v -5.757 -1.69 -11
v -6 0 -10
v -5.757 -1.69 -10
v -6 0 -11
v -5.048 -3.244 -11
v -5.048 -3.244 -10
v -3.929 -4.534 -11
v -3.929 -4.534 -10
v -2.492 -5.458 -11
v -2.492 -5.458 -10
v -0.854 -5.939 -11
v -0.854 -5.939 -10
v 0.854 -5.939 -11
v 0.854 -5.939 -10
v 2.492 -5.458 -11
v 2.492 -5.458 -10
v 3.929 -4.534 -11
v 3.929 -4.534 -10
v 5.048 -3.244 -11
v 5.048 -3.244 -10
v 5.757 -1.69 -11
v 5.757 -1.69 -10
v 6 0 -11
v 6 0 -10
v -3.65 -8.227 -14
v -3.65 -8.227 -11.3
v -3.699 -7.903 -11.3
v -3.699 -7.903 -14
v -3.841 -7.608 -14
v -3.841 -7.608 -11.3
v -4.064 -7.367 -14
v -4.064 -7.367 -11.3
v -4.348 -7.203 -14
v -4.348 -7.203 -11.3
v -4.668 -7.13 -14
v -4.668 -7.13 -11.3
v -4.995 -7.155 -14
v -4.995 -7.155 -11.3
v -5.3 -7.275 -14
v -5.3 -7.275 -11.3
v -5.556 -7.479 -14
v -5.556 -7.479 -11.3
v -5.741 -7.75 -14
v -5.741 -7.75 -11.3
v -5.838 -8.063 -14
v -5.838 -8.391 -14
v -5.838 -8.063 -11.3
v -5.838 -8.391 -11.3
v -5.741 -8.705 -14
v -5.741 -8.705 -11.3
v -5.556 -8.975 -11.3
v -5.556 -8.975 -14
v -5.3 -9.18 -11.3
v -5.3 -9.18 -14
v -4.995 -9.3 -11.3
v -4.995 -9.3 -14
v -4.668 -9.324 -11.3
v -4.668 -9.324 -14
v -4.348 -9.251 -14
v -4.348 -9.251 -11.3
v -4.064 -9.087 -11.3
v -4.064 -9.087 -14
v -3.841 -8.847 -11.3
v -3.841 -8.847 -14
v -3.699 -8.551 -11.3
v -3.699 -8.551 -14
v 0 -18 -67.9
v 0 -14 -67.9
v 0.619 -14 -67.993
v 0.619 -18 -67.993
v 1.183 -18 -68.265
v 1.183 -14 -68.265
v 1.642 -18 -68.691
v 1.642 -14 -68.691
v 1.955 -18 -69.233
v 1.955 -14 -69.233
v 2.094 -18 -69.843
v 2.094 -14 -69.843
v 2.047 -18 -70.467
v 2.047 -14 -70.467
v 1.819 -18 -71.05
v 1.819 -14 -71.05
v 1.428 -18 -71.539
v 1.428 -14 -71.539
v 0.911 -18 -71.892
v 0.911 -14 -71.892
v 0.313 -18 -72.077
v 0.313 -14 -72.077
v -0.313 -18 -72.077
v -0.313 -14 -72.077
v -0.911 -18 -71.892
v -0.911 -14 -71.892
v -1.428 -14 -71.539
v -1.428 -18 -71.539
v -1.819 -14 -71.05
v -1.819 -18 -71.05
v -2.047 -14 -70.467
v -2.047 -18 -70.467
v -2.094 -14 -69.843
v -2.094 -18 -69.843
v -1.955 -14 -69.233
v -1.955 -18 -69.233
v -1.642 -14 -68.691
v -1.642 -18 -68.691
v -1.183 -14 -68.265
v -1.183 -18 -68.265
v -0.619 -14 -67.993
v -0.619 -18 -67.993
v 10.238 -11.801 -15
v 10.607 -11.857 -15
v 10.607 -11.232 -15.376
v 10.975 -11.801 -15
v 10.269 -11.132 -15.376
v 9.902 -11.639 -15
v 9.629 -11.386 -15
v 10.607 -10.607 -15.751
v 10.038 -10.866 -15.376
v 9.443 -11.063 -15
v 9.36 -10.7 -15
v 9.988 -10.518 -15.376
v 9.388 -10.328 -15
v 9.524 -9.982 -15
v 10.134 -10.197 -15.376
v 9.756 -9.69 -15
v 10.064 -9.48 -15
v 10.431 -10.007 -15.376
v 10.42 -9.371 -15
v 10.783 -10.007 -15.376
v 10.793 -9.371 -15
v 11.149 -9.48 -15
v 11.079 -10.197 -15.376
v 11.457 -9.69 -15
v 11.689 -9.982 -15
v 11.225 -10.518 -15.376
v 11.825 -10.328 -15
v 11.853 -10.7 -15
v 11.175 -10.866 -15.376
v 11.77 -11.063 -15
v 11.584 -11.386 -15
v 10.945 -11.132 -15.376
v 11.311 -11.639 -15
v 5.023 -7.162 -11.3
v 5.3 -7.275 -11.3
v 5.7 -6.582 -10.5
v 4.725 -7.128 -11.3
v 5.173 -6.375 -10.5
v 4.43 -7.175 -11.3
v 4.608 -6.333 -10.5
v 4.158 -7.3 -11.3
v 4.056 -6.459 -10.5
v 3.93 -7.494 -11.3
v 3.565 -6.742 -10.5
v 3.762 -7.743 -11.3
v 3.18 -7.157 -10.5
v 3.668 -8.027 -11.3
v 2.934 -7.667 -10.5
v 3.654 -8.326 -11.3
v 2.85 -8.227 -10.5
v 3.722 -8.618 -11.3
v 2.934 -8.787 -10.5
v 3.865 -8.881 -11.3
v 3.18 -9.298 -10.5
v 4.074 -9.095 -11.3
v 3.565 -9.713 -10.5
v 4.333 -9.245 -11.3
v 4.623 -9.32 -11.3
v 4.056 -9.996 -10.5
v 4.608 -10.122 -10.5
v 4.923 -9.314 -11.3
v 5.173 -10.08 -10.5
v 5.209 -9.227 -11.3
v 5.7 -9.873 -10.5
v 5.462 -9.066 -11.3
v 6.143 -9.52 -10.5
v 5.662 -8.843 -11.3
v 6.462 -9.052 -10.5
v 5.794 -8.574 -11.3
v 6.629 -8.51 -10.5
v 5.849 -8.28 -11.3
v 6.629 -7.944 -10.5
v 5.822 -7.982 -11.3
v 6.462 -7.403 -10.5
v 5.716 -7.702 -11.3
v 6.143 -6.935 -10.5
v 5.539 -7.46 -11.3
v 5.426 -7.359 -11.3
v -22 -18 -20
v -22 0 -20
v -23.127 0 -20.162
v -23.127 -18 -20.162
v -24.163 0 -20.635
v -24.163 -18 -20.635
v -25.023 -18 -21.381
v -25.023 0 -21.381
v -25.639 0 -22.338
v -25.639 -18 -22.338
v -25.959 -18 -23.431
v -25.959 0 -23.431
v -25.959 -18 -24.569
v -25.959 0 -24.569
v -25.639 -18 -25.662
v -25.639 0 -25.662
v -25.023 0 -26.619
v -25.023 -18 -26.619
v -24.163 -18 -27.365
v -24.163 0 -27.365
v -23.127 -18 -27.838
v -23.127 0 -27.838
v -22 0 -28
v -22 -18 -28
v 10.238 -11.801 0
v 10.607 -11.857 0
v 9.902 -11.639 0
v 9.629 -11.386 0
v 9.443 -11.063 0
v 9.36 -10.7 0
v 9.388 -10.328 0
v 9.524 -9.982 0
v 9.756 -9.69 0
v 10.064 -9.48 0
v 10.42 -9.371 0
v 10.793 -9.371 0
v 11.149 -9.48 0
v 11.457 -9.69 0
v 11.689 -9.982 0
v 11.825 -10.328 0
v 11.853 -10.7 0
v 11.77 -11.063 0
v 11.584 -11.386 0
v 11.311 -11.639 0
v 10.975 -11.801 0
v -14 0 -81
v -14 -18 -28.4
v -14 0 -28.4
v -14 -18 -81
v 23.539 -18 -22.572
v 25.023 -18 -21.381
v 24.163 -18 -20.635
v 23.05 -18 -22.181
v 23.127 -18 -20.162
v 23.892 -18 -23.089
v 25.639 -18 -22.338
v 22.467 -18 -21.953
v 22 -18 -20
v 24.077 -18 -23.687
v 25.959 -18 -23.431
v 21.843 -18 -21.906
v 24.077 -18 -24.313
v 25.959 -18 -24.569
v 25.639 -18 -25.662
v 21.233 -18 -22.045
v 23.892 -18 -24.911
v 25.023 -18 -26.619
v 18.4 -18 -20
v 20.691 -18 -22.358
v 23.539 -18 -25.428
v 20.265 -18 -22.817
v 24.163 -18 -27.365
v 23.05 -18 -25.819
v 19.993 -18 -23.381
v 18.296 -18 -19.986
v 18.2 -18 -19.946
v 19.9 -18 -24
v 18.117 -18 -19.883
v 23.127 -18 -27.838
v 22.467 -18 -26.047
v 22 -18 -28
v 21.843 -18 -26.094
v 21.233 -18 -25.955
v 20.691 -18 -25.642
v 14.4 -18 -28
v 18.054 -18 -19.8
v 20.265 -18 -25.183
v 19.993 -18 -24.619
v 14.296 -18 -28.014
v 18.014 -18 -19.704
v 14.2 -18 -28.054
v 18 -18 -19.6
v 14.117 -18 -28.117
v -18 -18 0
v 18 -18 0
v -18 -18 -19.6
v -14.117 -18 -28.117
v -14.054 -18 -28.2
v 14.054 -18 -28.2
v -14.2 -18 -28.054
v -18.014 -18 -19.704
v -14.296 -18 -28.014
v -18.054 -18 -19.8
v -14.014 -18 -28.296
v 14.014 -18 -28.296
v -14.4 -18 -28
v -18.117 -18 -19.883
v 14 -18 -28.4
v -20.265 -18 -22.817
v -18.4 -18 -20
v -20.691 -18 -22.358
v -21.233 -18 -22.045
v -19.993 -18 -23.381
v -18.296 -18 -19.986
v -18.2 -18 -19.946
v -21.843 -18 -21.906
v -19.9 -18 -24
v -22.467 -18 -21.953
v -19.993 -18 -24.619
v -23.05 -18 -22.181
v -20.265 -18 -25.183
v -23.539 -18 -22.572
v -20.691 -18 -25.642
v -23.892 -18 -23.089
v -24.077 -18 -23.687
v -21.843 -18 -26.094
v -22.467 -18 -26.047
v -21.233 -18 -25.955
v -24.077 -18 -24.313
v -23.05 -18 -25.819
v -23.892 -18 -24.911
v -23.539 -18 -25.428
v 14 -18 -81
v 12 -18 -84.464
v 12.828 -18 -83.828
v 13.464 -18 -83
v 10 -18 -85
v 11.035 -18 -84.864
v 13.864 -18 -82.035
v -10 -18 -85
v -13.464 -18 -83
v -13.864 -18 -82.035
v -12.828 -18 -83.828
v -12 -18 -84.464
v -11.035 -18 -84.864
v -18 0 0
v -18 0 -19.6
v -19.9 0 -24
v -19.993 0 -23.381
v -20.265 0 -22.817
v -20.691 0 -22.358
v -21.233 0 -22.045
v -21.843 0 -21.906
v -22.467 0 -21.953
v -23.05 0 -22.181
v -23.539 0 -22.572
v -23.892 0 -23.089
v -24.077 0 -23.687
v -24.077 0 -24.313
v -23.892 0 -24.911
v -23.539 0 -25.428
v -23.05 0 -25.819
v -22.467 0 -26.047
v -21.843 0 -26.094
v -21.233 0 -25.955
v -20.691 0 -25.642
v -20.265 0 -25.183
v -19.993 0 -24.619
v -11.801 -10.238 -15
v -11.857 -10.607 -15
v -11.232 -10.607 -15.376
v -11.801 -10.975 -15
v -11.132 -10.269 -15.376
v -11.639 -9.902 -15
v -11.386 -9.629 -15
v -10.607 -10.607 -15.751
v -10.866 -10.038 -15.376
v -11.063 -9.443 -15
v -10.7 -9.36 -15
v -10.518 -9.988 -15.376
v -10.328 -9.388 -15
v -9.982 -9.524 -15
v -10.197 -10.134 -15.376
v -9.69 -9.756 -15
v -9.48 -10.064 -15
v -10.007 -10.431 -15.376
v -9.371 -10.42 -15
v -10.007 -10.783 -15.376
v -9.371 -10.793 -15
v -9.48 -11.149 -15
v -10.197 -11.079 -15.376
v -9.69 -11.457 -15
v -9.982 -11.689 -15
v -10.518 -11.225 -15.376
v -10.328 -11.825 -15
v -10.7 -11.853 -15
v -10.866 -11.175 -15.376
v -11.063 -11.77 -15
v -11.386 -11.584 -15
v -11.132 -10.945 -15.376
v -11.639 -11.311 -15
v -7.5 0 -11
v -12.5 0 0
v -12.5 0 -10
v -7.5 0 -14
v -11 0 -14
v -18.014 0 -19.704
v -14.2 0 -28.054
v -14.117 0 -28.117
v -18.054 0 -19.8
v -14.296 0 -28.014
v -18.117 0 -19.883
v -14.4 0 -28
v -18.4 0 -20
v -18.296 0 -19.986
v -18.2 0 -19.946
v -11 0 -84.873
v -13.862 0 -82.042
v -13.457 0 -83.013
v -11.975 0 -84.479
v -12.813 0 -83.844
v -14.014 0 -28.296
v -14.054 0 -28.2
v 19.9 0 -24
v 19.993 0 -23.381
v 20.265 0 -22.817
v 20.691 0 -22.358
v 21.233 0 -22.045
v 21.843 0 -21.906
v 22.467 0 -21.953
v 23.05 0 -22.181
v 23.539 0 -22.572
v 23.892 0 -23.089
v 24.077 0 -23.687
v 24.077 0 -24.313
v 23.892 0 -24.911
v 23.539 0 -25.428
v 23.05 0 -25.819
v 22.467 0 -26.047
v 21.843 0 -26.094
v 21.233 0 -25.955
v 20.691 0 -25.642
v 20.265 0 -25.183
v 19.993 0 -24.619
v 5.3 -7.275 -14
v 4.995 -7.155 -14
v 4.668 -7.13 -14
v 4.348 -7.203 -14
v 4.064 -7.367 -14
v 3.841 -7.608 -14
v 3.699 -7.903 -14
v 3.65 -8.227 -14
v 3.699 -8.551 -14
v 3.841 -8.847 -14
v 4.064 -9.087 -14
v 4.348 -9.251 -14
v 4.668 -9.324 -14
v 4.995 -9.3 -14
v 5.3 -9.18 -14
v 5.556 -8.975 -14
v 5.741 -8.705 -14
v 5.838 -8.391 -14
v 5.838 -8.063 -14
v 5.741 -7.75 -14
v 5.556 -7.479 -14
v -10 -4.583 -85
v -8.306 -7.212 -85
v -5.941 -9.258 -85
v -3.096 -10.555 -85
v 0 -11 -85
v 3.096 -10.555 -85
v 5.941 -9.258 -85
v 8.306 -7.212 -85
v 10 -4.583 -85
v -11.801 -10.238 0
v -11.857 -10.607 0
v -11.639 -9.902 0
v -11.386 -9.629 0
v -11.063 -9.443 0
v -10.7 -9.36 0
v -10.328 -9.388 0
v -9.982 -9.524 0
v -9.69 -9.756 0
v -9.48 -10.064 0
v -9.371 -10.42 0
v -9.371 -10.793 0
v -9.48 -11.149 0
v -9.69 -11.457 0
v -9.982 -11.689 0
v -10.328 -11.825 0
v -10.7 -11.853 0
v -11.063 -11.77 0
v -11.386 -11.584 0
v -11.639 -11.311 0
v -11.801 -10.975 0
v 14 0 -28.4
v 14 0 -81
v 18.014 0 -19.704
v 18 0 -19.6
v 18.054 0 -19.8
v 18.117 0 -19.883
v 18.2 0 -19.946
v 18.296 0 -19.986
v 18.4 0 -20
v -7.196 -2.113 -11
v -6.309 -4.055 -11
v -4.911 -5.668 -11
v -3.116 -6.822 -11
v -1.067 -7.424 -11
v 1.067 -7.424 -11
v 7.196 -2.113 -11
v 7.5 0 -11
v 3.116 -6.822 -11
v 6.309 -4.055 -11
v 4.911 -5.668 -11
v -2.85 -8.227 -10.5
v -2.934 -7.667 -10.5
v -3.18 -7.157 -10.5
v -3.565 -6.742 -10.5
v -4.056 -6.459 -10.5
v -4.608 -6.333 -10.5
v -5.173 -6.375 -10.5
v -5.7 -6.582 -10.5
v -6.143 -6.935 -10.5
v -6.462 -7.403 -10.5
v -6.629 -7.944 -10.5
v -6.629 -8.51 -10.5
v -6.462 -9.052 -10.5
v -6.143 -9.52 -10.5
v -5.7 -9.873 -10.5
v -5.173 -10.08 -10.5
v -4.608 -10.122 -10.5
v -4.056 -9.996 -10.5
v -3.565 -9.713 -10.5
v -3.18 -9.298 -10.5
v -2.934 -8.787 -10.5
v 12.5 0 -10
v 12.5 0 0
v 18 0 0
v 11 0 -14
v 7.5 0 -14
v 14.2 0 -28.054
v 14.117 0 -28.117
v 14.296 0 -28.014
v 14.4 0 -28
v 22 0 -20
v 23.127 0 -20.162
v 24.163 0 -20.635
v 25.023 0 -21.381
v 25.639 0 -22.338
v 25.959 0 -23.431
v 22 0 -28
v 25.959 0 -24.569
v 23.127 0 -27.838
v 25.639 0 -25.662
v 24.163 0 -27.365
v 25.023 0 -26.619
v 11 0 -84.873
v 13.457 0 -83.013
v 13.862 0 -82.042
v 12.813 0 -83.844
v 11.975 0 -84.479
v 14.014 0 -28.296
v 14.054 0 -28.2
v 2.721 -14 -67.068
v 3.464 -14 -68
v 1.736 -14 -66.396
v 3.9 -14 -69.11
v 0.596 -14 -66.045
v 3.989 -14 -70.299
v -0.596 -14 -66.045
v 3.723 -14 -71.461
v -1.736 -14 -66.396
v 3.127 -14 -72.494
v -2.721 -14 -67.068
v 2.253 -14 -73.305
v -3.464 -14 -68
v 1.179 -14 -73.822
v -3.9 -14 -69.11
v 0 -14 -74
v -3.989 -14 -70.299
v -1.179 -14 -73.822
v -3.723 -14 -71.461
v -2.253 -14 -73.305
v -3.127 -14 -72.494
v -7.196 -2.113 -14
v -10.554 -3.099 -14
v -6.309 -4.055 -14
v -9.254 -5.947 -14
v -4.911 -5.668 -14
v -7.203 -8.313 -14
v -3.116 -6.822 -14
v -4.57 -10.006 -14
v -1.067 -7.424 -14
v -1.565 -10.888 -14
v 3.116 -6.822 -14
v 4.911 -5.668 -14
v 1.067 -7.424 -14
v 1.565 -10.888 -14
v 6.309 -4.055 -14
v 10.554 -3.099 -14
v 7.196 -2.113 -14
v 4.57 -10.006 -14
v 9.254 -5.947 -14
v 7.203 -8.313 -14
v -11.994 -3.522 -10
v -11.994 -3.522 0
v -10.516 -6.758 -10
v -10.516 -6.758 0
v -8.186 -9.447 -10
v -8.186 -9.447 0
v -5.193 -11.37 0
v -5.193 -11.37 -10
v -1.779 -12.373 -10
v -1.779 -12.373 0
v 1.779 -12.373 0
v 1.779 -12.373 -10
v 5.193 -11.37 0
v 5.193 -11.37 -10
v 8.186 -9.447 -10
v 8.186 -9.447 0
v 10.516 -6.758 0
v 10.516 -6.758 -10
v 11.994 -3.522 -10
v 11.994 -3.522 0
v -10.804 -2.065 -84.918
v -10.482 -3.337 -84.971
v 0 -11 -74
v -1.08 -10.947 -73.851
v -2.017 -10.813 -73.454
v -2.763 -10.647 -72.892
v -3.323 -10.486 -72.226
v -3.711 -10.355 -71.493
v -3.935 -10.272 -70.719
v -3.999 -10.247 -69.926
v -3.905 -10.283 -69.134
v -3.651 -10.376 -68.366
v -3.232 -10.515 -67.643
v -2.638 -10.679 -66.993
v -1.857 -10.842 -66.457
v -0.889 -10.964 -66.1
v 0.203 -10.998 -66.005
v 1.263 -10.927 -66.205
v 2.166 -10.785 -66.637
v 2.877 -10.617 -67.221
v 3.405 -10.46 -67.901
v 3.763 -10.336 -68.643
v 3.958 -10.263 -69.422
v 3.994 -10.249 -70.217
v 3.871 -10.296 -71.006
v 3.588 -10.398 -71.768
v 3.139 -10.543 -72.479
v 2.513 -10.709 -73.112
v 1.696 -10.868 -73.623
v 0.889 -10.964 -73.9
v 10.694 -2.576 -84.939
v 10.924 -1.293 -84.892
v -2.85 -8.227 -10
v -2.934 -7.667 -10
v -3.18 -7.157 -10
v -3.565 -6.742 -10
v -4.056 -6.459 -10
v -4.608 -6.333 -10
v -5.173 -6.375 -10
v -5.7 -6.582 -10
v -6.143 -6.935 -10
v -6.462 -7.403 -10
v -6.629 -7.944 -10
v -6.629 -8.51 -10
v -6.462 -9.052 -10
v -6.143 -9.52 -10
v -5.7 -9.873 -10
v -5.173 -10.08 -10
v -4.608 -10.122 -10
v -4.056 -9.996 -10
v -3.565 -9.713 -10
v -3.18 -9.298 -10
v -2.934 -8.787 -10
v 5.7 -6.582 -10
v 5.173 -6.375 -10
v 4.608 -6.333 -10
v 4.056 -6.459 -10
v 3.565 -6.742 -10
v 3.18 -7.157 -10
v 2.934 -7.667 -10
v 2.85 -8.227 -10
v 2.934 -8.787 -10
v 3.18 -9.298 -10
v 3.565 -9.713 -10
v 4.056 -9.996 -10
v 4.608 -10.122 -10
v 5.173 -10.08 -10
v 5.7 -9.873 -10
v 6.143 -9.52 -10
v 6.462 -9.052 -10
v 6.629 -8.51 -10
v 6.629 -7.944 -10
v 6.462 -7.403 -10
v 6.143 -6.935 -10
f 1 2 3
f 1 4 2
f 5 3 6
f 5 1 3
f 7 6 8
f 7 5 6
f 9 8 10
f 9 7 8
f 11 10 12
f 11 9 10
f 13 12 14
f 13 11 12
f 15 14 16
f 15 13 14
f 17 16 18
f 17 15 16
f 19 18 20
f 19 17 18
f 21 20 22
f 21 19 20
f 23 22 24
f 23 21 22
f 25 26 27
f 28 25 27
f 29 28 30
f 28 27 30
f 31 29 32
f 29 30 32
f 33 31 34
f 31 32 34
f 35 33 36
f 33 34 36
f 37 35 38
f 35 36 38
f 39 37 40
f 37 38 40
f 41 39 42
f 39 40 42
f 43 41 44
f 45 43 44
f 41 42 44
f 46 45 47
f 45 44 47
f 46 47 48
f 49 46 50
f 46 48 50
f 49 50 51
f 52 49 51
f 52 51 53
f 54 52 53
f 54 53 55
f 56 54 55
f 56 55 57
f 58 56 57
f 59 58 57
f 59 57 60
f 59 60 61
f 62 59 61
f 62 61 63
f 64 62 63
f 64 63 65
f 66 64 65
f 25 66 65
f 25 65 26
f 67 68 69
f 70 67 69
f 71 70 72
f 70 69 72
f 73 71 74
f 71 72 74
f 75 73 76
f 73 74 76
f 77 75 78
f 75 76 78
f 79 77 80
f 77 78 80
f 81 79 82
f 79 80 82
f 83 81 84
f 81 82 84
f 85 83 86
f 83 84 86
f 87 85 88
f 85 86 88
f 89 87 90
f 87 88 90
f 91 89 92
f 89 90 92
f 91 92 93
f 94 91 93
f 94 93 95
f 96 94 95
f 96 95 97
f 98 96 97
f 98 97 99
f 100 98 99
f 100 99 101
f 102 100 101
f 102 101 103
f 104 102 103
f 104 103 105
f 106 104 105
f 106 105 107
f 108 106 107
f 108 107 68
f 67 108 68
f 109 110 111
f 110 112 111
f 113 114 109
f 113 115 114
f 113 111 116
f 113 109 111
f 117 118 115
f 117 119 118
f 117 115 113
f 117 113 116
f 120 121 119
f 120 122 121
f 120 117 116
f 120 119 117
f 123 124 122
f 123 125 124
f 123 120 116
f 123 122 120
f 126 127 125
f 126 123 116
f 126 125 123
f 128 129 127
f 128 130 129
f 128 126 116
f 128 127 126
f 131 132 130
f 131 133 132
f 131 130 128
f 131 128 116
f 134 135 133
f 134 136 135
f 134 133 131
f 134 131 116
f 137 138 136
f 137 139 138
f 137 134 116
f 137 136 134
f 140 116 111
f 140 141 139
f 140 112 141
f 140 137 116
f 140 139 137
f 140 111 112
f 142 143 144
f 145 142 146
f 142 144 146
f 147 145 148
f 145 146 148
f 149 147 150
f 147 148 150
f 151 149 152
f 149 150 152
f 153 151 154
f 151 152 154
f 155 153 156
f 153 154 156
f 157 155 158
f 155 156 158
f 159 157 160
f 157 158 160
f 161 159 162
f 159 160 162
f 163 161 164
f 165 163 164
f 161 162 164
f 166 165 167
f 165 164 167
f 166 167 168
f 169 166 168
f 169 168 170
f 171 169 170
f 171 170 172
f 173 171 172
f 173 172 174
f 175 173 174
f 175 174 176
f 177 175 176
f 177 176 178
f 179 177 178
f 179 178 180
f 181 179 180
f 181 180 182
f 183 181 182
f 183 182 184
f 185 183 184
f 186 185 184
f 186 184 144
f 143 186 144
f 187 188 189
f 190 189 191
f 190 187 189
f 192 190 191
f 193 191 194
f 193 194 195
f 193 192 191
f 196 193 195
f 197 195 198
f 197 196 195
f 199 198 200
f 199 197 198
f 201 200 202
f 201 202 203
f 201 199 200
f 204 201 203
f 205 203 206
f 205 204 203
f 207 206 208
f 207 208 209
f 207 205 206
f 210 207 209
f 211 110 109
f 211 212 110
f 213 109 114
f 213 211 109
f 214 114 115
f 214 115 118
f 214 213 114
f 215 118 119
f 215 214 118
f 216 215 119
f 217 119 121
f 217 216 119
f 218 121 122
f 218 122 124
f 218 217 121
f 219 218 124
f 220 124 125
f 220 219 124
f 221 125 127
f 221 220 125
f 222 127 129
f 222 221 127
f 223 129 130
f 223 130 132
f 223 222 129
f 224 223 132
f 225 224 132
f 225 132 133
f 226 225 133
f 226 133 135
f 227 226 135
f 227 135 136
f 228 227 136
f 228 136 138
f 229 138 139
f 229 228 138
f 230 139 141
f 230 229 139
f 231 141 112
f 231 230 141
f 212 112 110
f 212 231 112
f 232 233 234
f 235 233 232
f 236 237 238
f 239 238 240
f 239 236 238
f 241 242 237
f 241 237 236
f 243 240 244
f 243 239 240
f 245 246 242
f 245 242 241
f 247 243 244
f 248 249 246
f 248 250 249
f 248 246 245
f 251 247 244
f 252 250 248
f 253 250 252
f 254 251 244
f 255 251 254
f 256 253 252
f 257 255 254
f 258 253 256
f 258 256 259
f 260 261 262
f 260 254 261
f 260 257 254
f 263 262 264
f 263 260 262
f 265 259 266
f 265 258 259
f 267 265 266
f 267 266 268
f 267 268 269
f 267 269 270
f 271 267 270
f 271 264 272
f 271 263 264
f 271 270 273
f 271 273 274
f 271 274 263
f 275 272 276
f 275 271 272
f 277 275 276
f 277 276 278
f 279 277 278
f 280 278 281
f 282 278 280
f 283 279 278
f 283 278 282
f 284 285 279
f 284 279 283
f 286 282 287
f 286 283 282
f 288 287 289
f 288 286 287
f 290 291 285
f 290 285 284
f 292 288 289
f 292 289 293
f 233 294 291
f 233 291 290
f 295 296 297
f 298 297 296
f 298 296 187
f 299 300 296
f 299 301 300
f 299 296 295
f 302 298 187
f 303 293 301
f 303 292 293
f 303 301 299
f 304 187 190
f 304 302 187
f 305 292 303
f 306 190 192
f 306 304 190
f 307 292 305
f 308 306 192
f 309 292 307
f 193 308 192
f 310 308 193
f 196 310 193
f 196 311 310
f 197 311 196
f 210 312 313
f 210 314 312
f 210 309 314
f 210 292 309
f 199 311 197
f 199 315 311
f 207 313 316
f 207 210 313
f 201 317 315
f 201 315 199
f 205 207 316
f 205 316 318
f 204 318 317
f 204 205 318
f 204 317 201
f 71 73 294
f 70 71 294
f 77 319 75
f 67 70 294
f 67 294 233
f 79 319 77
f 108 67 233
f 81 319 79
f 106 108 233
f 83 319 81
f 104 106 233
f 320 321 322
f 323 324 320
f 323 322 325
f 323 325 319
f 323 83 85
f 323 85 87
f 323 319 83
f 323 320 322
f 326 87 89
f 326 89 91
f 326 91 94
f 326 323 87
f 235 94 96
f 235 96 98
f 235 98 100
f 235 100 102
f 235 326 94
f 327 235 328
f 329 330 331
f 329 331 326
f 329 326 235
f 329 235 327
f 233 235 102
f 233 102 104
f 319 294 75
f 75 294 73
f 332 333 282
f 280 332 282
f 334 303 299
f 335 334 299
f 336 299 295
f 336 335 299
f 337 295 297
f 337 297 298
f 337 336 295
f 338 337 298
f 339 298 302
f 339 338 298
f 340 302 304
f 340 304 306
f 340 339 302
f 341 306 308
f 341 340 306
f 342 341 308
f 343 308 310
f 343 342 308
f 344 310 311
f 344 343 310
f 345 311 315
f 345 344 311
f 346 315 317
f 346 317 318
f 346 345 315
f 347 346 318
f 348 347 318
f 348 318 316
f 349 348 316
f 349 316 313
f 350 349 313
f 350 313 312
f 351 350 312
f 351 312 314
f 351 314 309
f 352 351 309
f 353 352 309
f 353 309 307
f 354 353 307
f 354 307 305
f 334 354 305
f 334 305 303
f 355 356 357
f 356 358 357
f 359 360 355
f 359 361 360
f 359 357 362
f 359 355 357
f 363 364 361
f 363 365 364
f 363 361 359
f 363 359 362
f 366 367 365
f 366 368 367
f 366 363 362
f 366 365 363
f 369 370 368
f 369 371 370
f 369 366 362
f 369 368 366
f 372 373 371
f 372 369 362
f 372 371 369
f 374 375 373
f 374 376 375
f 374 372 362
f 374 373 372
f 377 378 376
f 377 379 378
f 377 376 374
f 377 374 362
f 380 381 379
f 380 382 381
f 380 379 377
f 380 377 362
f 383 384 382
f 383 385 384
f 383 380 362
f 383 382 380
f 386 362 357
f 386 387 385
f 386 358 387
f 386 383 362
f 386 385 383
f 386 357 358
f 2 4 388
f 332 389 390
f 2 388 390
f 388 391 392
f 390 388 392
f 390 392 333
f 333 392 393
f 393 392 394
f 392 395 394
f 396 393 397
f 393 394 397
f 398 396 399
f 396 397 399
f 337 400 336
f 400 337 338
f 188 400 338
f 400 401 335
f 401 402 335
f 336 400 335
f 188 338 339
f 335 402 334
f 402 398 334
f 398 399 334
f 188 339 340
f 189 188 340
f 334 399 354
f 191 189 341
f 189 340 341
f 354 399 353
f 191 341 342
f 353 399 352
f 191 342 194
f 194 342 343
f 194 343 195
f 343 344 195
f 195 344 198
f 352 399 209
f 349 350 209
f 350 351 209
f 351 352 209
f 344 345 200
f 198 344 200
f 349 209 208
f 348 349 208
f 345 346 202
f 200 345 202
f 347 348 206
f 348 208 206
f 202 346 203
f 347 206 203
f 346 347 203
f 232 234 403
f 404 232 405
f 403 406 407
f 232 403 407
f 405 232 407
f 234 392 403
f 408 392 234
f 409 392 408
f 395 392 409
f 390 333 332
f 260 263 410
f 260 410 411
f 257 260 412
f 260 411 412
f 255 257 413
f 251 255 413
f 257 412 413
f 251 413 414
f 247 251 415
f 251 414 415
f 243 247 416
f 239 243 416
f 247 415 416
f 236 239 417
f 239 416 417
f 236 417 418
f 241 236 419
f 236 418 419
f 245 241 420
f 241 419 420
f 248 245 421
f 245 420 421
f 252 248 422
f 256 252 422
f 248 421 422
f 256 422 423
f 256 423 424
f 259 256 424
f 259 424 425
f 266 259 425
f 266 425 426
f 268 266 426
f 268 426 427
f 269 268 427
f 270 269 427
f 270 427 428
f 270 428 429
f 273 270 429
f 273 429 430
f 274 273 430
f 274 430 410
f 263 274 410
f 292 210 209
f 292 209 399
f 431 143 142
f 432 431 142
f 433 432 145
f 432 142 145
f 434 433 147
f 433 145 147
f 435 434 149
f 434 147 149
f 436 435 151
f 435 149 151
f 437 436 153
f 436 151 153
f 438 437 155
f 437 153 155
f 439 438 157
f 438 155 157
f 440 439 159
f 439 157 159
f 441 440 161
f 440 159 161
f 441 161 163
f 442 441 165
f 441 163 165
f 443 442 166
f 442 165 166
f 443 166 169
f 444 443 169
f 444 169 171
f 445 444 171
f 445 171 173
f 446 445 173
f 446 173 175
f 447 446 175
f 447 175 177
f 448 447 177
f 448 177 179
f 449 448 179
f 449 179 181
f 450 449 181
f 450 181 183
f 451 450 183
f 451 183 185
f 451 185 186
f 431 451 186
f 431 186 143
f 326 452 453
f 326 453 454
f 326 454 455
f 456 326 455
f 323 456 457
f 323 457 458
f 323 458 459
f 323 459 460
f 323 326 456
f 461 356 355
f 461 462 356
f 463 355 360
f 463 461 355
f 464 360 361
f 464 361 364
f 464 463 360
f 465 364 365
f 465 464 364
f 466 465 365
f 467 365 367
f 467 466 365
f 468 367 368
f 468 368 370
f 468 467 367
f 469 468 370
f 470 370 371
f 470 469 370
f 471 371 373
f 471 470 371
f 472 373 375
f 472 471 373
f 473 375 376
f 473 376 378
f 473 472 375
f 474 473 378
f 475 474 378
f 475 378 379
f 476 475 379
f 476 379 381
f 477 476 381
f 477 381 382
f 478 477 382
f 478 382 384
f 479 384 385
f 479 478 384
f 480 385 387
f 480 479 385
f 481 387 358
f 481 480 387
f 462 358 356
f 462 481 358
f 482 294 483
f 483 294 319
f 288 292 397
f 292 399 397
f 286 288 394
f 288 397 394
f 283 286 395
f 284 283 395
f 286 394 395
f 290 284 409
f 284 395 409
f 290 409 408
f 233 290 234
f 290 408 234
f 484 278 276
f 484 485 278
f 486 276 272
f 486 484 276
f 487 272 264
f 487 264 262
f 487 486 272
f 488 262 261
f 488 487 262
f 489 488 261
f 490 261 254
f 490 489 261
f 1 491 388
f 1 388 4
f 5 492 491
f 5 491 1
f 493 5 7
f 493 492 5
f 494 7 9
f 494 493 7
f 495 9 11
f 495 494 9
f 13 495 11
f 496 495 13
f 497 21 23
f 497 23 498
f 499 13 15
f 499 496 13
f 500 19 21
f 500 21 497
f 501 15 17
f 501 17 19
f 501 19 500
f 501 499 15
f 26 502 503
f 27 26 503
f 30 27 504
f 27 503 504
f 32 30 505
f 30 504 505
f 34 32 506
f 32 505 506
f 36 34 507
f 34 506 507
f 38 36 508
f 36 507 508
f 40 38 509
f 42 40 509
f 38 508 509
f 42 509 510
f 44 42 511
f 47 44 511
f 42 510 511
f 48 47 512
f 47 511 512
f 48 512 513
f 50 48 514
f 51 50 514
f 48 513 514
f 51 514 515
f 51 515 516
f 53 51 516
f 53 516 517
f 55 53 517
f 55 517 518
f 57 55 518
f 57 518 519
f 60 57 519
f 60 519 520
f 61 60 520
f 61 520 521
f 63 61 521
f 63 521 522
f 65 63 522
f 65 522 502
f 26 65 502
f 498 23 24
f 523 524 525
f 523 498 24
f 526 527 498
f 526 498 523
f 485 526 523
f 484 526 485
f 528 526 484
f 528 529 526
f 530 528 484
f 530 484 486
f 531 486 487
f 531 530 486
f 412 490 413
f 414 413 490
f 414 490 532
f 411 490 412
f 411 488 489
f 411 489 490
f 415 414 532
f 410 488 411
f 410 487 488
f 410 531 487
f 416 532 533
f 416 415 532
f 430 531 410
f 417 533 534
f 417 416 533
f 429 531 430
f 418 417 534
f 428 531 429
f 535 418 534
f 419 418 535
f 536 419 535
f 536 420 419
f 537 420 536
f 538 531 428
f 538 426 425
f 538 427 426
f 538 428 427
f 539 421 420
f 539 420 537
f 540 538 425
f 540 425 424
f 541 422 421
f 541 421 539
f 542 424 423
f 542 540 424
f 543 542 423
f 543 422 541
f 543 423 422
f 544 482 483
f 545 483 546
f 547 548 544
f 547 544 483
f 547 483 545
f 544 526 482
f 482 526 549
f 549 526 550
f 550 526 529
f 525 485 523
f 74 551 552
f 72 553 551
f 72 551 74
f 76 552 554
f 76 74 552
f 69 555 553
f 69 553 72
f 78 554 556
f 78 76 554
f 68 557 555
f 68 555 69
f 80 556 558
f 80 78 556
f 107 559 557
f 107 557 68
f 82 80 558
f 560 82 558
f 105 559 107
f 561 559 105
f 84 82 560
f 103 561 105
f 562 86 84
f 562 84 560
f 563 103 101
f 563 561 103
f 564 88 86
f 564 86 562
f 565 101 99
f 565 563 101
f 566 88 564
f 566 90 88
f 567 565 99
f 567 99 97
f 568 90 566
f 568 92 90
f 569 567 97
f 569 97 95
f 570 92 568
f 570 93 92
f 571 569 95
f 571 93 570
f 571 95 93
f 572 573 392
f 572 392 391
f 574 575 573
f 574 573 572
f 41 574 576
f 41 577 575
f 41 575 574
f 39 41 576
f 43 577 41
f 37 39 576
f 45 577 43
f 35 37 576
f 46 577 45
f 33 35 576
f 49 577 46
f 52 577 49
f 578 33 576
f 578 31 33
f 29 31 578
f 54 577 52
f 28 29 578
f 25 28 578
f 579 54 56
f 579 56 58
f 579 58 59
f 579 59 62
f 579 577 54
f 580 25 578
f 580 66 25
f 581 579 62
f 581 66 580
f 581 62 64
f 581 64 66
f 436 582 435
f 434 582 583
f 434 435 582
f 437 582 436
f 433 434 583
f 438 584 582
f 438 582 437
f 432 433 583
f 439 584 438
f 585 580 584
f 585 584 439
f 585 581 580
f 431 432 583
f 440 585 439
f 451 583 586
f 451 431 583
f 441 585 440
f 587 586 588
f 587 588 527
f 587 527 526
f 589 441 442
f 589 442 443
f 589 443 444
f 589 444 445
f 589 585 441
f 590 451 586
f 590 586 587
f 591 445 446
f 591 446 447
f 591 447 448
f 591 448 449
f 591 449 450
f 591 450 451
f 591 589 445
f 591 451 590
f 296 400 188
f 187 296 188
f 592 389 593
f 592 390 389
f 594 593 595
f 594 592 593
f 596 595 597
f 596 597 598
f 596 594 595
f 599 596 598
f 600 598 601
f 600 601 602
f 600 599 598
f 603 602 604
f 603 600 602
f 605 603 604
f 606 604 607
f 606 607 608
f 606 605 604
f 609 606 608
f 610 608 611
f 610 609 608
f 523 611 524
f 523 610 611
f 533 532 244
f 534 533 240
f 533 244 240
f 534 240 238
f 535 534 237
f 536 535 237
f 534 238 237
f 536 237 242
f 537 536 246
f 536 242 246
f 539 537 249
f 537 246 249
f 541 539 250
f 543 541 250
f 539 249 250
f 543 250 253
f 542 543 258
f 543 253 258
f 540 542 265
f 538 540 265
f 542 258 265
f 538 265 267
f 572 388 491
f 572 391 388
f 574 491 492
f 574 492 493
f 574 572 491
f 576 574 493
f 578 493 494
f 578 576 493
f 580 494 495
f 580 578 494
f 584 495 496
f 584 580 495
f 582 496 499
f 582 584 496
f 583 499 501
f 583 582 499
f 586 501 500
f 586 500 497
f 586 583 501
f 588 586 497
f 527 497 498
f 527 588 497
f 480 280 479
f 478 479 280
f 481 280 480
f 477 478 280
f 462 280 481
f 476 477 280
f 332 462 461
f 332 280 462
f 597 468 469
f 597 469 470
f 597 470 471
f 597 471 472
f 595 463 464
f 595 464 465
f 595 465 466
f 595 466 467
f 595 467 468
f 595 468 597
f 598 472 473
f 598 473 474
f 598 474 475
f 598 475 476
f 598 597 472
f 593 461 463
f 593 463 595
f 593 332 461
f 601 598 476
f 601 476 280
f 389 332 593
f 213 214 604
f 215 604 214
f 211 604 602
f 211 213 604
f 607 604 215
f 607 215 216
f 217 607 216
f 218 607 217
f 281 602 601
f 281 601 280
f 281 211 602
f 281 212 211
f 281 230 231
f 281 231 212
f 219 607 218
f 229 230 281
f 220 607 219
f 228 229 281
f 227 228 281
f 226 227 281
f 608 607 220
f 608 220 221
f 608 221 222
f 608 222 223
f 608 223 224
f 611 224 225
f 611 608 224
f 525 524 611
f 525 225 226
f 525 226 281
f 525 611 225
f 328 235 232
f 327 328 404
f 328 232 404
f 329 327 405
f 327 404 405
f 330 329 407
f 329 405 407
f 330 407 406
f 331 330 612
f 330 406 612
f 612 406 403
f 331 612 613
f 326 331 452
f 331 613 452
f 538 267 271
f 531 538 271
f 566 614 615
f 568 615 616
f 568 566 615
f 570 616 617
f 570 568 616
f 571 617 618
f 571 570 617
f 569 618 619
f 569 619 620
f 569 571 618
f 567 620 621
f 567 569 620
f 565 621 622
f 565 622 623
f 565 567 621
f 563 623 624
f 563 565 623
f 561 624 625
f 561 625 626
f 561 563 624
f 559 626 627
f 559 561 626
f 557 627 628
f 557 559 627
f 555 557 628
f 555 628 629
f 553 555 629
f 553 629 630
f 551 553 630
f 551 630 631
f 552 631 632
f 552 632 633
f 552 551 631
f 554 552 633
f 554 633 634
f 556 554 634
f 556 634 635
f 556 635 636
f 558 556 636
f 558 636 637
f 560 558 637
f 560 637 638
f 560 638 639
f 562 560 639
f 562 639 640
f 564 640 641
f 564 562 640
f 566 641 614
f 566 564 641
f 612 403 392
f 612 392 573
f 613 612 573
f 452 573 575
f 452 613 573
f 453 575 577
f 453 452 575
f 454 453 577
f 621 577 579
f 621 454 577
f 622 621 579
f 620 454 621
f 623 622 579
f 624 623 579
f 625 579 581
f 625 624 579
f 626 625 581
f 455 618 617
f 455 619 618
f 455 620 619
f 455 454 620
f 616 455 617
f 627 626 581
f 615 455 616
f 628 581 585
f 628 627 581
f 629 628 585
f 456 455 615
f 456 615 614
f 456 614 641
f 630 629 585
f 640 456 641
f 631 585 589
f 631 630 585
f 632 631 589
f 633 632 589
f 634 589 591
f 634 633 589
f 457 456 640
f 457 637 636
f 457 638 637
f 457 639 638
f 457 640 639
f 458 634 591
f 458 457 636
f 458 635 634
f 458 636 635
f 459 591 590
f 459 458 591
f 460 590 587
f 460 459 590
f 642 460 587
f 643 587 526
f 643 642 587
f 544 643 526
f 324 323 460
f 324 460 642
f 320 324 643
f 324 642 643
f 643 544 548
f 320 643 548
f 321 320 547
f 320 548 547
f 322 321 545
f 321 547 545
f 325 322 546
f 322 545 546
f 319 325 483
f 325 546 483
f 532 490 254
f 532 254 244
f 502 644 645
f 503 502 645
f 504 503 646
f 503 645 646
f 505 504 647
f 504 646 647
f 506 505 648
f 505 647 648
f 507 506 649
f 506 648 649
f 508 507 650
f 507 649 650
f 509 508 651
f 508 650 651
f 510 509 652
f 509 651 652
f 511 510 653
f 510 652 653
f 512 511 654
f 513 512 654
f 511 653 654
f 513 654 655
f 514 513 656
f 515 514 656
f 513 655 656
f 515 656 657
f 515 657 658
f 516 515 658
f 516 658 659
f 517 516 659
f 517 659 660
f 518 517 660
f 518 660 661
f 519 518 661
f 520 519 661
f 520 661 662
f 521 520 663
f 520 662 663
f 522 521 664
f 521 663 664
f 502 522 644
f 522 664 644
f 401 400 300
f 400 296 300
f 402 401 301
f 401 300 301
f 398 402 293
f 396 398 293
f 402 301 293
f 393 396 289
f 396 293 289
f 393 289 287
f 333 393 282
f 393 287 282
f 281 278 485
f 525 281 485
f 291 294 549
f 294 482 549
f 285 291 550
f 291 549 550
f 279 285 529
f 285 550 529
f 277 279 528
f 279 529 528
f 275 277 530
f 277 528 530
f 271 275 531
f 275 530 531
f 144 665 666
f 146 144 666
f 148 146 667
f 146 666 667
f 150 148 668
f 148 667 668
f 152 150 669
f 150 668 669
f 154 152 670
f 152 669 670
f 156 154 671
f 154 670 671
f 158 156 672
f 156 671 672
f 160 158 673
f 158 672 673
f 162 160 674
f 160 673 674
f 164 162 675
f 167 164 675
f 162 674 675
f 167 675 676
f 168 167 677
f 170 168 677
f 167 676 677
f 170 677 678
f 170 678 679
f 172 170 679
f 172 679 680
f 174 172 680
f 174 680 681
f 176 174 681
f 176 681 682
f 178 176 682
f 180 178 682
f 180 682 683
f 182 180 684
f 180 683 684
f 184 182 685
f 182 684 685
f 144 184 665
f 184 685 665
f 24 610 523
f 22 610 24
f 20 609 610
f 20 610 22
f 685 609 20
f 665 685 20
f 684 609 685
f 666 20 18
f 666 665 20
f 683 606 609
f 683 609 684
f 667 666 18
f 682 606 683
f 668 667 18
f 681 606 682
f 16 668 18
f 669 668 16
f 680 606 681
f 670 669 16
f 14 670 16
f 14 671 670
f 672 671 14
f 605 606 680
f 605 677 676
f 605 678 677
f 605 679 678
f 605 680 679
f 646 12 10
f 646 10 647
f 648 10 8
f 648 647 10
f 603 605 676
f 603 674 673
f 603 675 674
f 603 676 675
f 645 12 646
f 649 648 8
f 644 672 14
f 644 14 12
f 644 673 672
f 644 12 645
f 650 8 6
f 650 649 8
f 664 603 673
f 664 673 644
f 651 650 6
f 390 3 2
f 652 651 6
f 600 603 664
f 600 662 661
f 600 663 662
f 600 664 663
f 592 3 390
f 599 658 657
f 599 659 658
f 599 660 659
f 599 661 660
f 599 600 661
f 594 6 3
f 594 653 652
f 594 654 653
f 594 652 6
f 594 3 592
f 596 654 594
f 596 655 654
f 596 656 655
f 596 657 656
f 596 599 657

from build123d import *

# Parameters (mm, degrees)
REVOLVE_1_ANGLE                    = 180
EXTRUDE_START                      = -20
EXTRUDE_1_DEPTH                    = 20
EXTRUDE_2_REACH                    = 90.73
SKETCH_3_W                         = 28
SKETCH_3_H                         = 65
CUT_EXTRUDE_1_DEPTH                = 3
CUT_EXTRUDE_1_DEPTH_BACK           = 3
SKETCH_4_R                         = 4
CUT_EXTRUDE_2_REACH                = 90.006
SKETCH_5_R                         = 2.1
EXTRUDE_3_DEPTH                    = 18
CUT_EXTRUDE_3_REACH                = 92.692
SKETCH_7_R                         = 2.1
CUT_EXTRUDE_4_REACH                = 83.394
SKETCH_8_R                         = 1.1
SKETCH_9_R                         = 1.9
CUT_EXTRUDE_5_DEPTH                = 0.5
SKETCH_10_R                        = 1.9
CUT_EXTRUDE_6_DEPTH                = 1.2
CUT_EXTRUDE_6_DRAFT                = -45
PATTERN_CIRCULAR_1_COUNT           = 2
PATTERN_CIRCULAR_1_ANGLE           = 60
PATTERN_CIRCULAR_1_COPY_1_SKETCH_R = 1.9
PATTERN_CIRCULAR_1_COPY_1_DEPTH    = 1.2
PATTERN_CIRCULAR_1_COPY_1_DRAFT    = -45
HOLE_WIZARD_M31_AT_2_COUNT         = 2
HOLE_WIZARD_M31_AT_2_PITCH         = 15
PATTERN_CIRCULAR_2_COUNT           = 2
PATTERN_CIRCULAR_2_ANGLE           = 90
FILLET_1_R                         = 0.4
FILLET_2_R                         = 4


# Read off the part's stored shape, not the designer's step: Бобышка-Вытянуть1
with BuildPart() as part:
    # Эскиз1 → Повернуть1 (revolve)
    with BuildSketch(Plane(origin=(0, 0, 0), x_dir=(1, 0, 0), z_dir=(0, 1, 0))):
        Polygon((-11, 85), (-14, 85), (-14, 20), (-18, 20), (-18, 0), (-12.5, 0), (-12.5, 10), (-6, 10), (-6, 11), (-7.5, 11), (-7.5, 14), (-11, 14), align=None)
    revolve(axis=Axis((0, 0, 0), (0, 0, 1)), revolution_arc=REVOLVE_1_ANGLE)

    # Бобышка-Вытянуть1 outline → Бобышка-Вытянуть1 (add)
    with BuildSketch(Plane.XY.offset(EXTRUDE_START)):
        with BuildLine():
            Line((-18, -18), (0, -18))
            ThreePointArc((0, -18), (-12.727922061, -12.727922061), (-18, 0))
            Line((-18, 0), (-18, -18))
        make_face()
        with BuildLine():
            Line((18, -18), (18, 0))
            ThreePointArc((18, 0), (12.727922061, -12.727922061), (0, -18))
            Line((0, -18), (18, -18))
        make_face()
    extrude(amount=EXTRUDE_1_DEPTH)

    # Эскиз3 → Бобышка-Вытянуть2 (add, up to next)
    with BuildSketch(Plane(origin=(0, -18, 0), x_dir=(1, 0, 0), z_dir=(0, 1, 0)), mode=Mode.PRIVATE) as extrude_2_sk1:
        with Locations((0, 52.5)):
            Rectangle(SKETCH_3_W, SKETCH_3_H)
    extrude_2_tool1 = extrude(extrude_2_sk1.sketch, amount=EXTRUDE_2_REACH, mode=Mode.PRIVATE) - part.part
    add(extrude_2_tool1.solids().sort_by_distance((0, -18, -52.5))[0])

    # Эскиз4 → Вырез-Вытянуть1 (cut, two sides: drawn at the far end of the back side and taken through both)
    with BuildSketch(Plane(origin=(0, -11, 0), x_dir=(1, 0, 0), z_dir=(0, 1, 0)).offset(-CUT_EXTRUDE_1_DEPTH_BACK)):
        with Locations(Location((0, 70, 0), (0, 0, 90))):
            Circle(SKETCH_4_R)
    extrude(amount=CUT_EXTRUDE_1_DEPTH + CUT_EXTRUDE_1_DEPTH_BACK, mode=Mode.SUBTRACT)

    # Эскиз5 → Вырез-Вытянуть2 (cut, up to next)
    with BuildSketch(Plane(origin=(0, -14, 0), x_dir=(1, 0, 0), z_dir=(0, 1, 0)), mode=Mode.PRIVATE) as cut_extrude_2_sk1:
        with Locations(Location((0, 70, 0), (0, 0, 270))):
            Circle(SKETCH_5_R)
    cut_extrude_2_tool1 = extrude(cut_extrude_2_sk1.sketch, amount=-CUT_EXTRUDE_2_REACH, mode=Mode.PRIVATE) & part.part
    add(cut_extrude_2_tool1.solids().sort_by_distance((0, -14, -70))[0], mode=Mode.SUBTRACT)

    # Эскиз6 → Бобышка-Вытянуть3 (add)
    with BuildSketch(Plane(origin=(0, -18, 0), x_dir=(1, 0, 0), z_dir=(0, 1, 0))):
        with BuildLine():
            Line((14, 20), (22, 20))
            ThreePointArc((22, 20), (26, 24), (22, 28))
            Line((22, 28), (14, 28))
            Line((14, 28), (14, 20))
        make_face()
    extrude_3 = extrude(amount=EXTRUDE_3_DEPTH)

    # Эскиз7 → Вырез-Вытянуть3 (cut, up to next)
    with BuildSketch(Plane(origin=(0, 0, 0), x_dir=(1, 0, 0), z_dir=(0, 1, 0)), mode=Mode.PRIVATE) as cut_extrude_3_sk1:
        with Locations(Location((22, 24, 0), (0, 0, 180))):
            Circle(SKETCH_7_R)
    cut_extrude_3_tool1 = extrude(cut_extrude_3_sk1.sketch, amount=-CUT_EXTRUDE_3_REACH, mode=Mode.PRIVATE) & part.part
    cut_extrude_3 = cut_extrude_3_tool1.solids().sort_by_distance((22, 0, -24))[0]
    add(cut_extrude_3, mode=Mode.SUBTRACT)

    # Зеркальное отражение1: Бобышка-Вытянуть3, Вырез-Вытянуть3 across plane
    add(extrude_3.mirror(Plane(origin=(0, 0, 0), x_dir=(0, 0, 1), z_dir=(1, 0, 0))))
    add(cut_extrude_3.mirror(Plane(origin=(0, 0, 0), x_dir=(0, 0, 1), z_dir=(1, 0, 0))), mode=Mode.SUBTRACT)

    # Эскиз8 → Вырез-Вытянуть4 (cut, up to next)
    with BuildSketch(Plane.XY.offset(-10), mode=Mode.PRIVATE) as cut_extrude_4_sk1:
        with Locations((-4.75, -8.227241336)):
            Circle(SKETCH_8_R)
    cut_extrude_4_tool1 = extrude(cut_extrude_4_sk1.sketch, amount=-CUT_EXTRUDE_4_REACH, mode=Mode.PRIVATE) & part.part
    cut_extrude_4 = cut_extrude_4_tool1.solids().sort_by_distance((-4.75, -8.227241, -10))[0]
    add(cut_extrude_4, mode=Mode.SUBTRACT)

    # Эскиз9 → Вырез-Вытянуть5 (cut)
    with BuildSketch(Plane.XY.offset(-10)):
        with Locations((-4.75, -8.227241336)):
            Circle(SKETCH_9_R)
    cut_extrude_5 = extrude(amount=-CUT_EXTRUDE_5_DEPTH, mode=Mode.SUBTRACT)


with BuildPart() as cut_extrude_6_tool:
    # Эскиз10 → Вырез-Вытянуть6 (with draft: the straight prism first)
    with BuildSketch(Plane.XY.offset(-10.5)):
        with Locations((-4.75, -8.227241336)):
            Circle(SKETCH_10_R)
    extrude(amount=-CUT_EXTRUDE_6_DEPTH)
    # Вырез-Вытянуть6: the draft: its side faces are tilted about the plane it starts from
    cut_extrude_6_sides = [cut_extrude_6_tool.faces().sort_by_distance(p)[0] for p in [
        (-6.65, -8.227241336, -11.1),
    ]]
    draft(cut_extrude_6_sides, Plane.XY.offset(-10.5), CUT_EXTRUDE_6_DRAFT)


with BuildPart() as part_1:
    add(part.part)

    # Вырез-Вытянуть6: cut by cut_extrude_6_tool
    add(cut_extrude_6_tool.part, mode=Mode.SUBTRACT)

    # Круговой массив1: Вырез-Вытянуть4, Вырез-Вытянуть5 ×2 about axis
    pattern_circular_1_axis = Axis((0, 0, 0), (0, 0, 1))
    add([cut_extrude_4.rotate(pattern_circular_1_axis, i * PATTERN_CIRCULAR_1_ANGLE / (PATTERN_CIRCULAR_1_COUNT - 1)) for i in range(1, PATTERN_CIRCULAR_1_COUNT)], mode=Mode.SUBTRACT)
    add([cut_extrude_5.rotate(pattern_circular_1_axis, i * PATTERN_CIRCULAR_1_ANGLE / (PATTERN_CIRCULAR_1_COUNT - 1)) for i in range(1, PATTERN_CIRCULAR_1_COUNT)], mode=Mode.SUBTRACT)


with BuildPart() as pattern_circular_1_copy_1_tool:
    # Круговой массив1 copy 1 sketch → Круговой массив1 copy 1 (with draft: the straight prism first)
    with BuildSketch(Plane(origin=(0, 0, -10.5), x_dir=(0.4999999999999978, 0.8660254037844399, 0), z_dir=(0, 0, 1))):
        with Locations((-4.75, -8.227241336)):
            Circle(PATTERN_CIRCULAR_1_COPY_1_SKETCH_R)
    extrude(amount=-PATTERN_CIRCULAR_1_COPY_1_DEPTH)
    # Круговой массив1 copy 1: the draft: its side faces are tilted about the plane it starts from
    pattern_circular_1_copy_1_sides = [pattern_circular_1_copy_1_tool.faces().sort_by_distance(p)[0] for p in [
        (3.8, -9.872689603, -11.1),
    ]]
    draft(pattern_circular_1_copy_1_sides, Plane(origin=(0, 0, -10.5), x_dir=(0.4999999999999978, 0.8660254037844399, 0), z_dir=(0, 0, 1)), PATTERN_CIRCULAR_1_COPY_1_DRAFT)


with BuildPart() as part_2:
    add(part_1.part)

    # Круговой массив1 copy 1: cut by pattern_circular_1_copy_1_tool
    add(pattern_circular_1_copy_1_tool.part, mode=Mode.SUBTRACT)

    # Эскиз11 → Сверление под метчик M31 (revolve, cut)
    with BuildSketch(Plane(origin=(10.606601718, -10.606601718, 0), x_dir=(0, -1, 0), z_dir=(1, 0, 0))):
        Polygon((0, 0), (0, 15.751075774), (1.25, 15), (1.25, 0), align=None)
    hole_wizard_m31 = revolve(axis=Axis((10.606601718, -10.606601718, 6.35), (0, 0, -1)), mode=Mode.SUBTRACT)

    # Сверление под метчик M31 at 2: Сверление под метчик M31 ×2
    with Locations(*[Vector(-0.7071067811865464, 0.7071067811865487, 0) * (i * HOLE_WIZARD_M31_AT_2_PITCH) for i in range(1, HOLE_WIZARD_M31_AT_2_COUNT)]):
        add(hole_wizard_m31, mode=Mode.SUBTRACT)

    # Круговой массив2: Сверление под метчик M31 ×2 about axis
    pattern_circular_2_axis = Axis((0, 0, 0), (0, 0, -1))
    for i in range(1, PATTERN_CIRCULAR_2_COUNT):
        add(hole_wizard_m31.rotate(pattern_circular_2_axis, i * PATTERN_CIRCULAR_2_ANGLE / (PATTERN_CIRCULAR_2_COUNT - 1)), mode=Mode.SUBTRACT)

    # Круговой массив2 copy 1 sketch → Круговой массив2 copy 1 (revolve, cut)
    with BuildSketch(Plane(origin=(0, 0, 0), x_dir=(-1, 0, 0), z_dir=(0, -1, 0))):
        Polygon((0, 0), (0, 15.751075774), (1.25, 15), (1.25, 0), align=None)
    revolve(axis=Axis((0, 0, 6.35), (0, 0, -1)), mode=Mode.SUBTRACT)

    # Скругление1
    fillet_1_edges = [part_2.edges().sort_by_distance(p)[0] for p in [
        (18, -9, -20),
        (-18, -9, -20),
        (14, -9, -28),
        (-14, -9, -28),
    ]]
    fillet(fillet_1_edges, radius=FILLET_1_R)

    # Скругление2
    fillet_2_edges = [part_2.edges().sort_by_distance(p)[0] for p in [
        (-14, -9, -85),
        (14, -9, -85),
    ]]
    fillet(fillet_2_edges, radius=FILLET_2_R)


solid = part_2.part
